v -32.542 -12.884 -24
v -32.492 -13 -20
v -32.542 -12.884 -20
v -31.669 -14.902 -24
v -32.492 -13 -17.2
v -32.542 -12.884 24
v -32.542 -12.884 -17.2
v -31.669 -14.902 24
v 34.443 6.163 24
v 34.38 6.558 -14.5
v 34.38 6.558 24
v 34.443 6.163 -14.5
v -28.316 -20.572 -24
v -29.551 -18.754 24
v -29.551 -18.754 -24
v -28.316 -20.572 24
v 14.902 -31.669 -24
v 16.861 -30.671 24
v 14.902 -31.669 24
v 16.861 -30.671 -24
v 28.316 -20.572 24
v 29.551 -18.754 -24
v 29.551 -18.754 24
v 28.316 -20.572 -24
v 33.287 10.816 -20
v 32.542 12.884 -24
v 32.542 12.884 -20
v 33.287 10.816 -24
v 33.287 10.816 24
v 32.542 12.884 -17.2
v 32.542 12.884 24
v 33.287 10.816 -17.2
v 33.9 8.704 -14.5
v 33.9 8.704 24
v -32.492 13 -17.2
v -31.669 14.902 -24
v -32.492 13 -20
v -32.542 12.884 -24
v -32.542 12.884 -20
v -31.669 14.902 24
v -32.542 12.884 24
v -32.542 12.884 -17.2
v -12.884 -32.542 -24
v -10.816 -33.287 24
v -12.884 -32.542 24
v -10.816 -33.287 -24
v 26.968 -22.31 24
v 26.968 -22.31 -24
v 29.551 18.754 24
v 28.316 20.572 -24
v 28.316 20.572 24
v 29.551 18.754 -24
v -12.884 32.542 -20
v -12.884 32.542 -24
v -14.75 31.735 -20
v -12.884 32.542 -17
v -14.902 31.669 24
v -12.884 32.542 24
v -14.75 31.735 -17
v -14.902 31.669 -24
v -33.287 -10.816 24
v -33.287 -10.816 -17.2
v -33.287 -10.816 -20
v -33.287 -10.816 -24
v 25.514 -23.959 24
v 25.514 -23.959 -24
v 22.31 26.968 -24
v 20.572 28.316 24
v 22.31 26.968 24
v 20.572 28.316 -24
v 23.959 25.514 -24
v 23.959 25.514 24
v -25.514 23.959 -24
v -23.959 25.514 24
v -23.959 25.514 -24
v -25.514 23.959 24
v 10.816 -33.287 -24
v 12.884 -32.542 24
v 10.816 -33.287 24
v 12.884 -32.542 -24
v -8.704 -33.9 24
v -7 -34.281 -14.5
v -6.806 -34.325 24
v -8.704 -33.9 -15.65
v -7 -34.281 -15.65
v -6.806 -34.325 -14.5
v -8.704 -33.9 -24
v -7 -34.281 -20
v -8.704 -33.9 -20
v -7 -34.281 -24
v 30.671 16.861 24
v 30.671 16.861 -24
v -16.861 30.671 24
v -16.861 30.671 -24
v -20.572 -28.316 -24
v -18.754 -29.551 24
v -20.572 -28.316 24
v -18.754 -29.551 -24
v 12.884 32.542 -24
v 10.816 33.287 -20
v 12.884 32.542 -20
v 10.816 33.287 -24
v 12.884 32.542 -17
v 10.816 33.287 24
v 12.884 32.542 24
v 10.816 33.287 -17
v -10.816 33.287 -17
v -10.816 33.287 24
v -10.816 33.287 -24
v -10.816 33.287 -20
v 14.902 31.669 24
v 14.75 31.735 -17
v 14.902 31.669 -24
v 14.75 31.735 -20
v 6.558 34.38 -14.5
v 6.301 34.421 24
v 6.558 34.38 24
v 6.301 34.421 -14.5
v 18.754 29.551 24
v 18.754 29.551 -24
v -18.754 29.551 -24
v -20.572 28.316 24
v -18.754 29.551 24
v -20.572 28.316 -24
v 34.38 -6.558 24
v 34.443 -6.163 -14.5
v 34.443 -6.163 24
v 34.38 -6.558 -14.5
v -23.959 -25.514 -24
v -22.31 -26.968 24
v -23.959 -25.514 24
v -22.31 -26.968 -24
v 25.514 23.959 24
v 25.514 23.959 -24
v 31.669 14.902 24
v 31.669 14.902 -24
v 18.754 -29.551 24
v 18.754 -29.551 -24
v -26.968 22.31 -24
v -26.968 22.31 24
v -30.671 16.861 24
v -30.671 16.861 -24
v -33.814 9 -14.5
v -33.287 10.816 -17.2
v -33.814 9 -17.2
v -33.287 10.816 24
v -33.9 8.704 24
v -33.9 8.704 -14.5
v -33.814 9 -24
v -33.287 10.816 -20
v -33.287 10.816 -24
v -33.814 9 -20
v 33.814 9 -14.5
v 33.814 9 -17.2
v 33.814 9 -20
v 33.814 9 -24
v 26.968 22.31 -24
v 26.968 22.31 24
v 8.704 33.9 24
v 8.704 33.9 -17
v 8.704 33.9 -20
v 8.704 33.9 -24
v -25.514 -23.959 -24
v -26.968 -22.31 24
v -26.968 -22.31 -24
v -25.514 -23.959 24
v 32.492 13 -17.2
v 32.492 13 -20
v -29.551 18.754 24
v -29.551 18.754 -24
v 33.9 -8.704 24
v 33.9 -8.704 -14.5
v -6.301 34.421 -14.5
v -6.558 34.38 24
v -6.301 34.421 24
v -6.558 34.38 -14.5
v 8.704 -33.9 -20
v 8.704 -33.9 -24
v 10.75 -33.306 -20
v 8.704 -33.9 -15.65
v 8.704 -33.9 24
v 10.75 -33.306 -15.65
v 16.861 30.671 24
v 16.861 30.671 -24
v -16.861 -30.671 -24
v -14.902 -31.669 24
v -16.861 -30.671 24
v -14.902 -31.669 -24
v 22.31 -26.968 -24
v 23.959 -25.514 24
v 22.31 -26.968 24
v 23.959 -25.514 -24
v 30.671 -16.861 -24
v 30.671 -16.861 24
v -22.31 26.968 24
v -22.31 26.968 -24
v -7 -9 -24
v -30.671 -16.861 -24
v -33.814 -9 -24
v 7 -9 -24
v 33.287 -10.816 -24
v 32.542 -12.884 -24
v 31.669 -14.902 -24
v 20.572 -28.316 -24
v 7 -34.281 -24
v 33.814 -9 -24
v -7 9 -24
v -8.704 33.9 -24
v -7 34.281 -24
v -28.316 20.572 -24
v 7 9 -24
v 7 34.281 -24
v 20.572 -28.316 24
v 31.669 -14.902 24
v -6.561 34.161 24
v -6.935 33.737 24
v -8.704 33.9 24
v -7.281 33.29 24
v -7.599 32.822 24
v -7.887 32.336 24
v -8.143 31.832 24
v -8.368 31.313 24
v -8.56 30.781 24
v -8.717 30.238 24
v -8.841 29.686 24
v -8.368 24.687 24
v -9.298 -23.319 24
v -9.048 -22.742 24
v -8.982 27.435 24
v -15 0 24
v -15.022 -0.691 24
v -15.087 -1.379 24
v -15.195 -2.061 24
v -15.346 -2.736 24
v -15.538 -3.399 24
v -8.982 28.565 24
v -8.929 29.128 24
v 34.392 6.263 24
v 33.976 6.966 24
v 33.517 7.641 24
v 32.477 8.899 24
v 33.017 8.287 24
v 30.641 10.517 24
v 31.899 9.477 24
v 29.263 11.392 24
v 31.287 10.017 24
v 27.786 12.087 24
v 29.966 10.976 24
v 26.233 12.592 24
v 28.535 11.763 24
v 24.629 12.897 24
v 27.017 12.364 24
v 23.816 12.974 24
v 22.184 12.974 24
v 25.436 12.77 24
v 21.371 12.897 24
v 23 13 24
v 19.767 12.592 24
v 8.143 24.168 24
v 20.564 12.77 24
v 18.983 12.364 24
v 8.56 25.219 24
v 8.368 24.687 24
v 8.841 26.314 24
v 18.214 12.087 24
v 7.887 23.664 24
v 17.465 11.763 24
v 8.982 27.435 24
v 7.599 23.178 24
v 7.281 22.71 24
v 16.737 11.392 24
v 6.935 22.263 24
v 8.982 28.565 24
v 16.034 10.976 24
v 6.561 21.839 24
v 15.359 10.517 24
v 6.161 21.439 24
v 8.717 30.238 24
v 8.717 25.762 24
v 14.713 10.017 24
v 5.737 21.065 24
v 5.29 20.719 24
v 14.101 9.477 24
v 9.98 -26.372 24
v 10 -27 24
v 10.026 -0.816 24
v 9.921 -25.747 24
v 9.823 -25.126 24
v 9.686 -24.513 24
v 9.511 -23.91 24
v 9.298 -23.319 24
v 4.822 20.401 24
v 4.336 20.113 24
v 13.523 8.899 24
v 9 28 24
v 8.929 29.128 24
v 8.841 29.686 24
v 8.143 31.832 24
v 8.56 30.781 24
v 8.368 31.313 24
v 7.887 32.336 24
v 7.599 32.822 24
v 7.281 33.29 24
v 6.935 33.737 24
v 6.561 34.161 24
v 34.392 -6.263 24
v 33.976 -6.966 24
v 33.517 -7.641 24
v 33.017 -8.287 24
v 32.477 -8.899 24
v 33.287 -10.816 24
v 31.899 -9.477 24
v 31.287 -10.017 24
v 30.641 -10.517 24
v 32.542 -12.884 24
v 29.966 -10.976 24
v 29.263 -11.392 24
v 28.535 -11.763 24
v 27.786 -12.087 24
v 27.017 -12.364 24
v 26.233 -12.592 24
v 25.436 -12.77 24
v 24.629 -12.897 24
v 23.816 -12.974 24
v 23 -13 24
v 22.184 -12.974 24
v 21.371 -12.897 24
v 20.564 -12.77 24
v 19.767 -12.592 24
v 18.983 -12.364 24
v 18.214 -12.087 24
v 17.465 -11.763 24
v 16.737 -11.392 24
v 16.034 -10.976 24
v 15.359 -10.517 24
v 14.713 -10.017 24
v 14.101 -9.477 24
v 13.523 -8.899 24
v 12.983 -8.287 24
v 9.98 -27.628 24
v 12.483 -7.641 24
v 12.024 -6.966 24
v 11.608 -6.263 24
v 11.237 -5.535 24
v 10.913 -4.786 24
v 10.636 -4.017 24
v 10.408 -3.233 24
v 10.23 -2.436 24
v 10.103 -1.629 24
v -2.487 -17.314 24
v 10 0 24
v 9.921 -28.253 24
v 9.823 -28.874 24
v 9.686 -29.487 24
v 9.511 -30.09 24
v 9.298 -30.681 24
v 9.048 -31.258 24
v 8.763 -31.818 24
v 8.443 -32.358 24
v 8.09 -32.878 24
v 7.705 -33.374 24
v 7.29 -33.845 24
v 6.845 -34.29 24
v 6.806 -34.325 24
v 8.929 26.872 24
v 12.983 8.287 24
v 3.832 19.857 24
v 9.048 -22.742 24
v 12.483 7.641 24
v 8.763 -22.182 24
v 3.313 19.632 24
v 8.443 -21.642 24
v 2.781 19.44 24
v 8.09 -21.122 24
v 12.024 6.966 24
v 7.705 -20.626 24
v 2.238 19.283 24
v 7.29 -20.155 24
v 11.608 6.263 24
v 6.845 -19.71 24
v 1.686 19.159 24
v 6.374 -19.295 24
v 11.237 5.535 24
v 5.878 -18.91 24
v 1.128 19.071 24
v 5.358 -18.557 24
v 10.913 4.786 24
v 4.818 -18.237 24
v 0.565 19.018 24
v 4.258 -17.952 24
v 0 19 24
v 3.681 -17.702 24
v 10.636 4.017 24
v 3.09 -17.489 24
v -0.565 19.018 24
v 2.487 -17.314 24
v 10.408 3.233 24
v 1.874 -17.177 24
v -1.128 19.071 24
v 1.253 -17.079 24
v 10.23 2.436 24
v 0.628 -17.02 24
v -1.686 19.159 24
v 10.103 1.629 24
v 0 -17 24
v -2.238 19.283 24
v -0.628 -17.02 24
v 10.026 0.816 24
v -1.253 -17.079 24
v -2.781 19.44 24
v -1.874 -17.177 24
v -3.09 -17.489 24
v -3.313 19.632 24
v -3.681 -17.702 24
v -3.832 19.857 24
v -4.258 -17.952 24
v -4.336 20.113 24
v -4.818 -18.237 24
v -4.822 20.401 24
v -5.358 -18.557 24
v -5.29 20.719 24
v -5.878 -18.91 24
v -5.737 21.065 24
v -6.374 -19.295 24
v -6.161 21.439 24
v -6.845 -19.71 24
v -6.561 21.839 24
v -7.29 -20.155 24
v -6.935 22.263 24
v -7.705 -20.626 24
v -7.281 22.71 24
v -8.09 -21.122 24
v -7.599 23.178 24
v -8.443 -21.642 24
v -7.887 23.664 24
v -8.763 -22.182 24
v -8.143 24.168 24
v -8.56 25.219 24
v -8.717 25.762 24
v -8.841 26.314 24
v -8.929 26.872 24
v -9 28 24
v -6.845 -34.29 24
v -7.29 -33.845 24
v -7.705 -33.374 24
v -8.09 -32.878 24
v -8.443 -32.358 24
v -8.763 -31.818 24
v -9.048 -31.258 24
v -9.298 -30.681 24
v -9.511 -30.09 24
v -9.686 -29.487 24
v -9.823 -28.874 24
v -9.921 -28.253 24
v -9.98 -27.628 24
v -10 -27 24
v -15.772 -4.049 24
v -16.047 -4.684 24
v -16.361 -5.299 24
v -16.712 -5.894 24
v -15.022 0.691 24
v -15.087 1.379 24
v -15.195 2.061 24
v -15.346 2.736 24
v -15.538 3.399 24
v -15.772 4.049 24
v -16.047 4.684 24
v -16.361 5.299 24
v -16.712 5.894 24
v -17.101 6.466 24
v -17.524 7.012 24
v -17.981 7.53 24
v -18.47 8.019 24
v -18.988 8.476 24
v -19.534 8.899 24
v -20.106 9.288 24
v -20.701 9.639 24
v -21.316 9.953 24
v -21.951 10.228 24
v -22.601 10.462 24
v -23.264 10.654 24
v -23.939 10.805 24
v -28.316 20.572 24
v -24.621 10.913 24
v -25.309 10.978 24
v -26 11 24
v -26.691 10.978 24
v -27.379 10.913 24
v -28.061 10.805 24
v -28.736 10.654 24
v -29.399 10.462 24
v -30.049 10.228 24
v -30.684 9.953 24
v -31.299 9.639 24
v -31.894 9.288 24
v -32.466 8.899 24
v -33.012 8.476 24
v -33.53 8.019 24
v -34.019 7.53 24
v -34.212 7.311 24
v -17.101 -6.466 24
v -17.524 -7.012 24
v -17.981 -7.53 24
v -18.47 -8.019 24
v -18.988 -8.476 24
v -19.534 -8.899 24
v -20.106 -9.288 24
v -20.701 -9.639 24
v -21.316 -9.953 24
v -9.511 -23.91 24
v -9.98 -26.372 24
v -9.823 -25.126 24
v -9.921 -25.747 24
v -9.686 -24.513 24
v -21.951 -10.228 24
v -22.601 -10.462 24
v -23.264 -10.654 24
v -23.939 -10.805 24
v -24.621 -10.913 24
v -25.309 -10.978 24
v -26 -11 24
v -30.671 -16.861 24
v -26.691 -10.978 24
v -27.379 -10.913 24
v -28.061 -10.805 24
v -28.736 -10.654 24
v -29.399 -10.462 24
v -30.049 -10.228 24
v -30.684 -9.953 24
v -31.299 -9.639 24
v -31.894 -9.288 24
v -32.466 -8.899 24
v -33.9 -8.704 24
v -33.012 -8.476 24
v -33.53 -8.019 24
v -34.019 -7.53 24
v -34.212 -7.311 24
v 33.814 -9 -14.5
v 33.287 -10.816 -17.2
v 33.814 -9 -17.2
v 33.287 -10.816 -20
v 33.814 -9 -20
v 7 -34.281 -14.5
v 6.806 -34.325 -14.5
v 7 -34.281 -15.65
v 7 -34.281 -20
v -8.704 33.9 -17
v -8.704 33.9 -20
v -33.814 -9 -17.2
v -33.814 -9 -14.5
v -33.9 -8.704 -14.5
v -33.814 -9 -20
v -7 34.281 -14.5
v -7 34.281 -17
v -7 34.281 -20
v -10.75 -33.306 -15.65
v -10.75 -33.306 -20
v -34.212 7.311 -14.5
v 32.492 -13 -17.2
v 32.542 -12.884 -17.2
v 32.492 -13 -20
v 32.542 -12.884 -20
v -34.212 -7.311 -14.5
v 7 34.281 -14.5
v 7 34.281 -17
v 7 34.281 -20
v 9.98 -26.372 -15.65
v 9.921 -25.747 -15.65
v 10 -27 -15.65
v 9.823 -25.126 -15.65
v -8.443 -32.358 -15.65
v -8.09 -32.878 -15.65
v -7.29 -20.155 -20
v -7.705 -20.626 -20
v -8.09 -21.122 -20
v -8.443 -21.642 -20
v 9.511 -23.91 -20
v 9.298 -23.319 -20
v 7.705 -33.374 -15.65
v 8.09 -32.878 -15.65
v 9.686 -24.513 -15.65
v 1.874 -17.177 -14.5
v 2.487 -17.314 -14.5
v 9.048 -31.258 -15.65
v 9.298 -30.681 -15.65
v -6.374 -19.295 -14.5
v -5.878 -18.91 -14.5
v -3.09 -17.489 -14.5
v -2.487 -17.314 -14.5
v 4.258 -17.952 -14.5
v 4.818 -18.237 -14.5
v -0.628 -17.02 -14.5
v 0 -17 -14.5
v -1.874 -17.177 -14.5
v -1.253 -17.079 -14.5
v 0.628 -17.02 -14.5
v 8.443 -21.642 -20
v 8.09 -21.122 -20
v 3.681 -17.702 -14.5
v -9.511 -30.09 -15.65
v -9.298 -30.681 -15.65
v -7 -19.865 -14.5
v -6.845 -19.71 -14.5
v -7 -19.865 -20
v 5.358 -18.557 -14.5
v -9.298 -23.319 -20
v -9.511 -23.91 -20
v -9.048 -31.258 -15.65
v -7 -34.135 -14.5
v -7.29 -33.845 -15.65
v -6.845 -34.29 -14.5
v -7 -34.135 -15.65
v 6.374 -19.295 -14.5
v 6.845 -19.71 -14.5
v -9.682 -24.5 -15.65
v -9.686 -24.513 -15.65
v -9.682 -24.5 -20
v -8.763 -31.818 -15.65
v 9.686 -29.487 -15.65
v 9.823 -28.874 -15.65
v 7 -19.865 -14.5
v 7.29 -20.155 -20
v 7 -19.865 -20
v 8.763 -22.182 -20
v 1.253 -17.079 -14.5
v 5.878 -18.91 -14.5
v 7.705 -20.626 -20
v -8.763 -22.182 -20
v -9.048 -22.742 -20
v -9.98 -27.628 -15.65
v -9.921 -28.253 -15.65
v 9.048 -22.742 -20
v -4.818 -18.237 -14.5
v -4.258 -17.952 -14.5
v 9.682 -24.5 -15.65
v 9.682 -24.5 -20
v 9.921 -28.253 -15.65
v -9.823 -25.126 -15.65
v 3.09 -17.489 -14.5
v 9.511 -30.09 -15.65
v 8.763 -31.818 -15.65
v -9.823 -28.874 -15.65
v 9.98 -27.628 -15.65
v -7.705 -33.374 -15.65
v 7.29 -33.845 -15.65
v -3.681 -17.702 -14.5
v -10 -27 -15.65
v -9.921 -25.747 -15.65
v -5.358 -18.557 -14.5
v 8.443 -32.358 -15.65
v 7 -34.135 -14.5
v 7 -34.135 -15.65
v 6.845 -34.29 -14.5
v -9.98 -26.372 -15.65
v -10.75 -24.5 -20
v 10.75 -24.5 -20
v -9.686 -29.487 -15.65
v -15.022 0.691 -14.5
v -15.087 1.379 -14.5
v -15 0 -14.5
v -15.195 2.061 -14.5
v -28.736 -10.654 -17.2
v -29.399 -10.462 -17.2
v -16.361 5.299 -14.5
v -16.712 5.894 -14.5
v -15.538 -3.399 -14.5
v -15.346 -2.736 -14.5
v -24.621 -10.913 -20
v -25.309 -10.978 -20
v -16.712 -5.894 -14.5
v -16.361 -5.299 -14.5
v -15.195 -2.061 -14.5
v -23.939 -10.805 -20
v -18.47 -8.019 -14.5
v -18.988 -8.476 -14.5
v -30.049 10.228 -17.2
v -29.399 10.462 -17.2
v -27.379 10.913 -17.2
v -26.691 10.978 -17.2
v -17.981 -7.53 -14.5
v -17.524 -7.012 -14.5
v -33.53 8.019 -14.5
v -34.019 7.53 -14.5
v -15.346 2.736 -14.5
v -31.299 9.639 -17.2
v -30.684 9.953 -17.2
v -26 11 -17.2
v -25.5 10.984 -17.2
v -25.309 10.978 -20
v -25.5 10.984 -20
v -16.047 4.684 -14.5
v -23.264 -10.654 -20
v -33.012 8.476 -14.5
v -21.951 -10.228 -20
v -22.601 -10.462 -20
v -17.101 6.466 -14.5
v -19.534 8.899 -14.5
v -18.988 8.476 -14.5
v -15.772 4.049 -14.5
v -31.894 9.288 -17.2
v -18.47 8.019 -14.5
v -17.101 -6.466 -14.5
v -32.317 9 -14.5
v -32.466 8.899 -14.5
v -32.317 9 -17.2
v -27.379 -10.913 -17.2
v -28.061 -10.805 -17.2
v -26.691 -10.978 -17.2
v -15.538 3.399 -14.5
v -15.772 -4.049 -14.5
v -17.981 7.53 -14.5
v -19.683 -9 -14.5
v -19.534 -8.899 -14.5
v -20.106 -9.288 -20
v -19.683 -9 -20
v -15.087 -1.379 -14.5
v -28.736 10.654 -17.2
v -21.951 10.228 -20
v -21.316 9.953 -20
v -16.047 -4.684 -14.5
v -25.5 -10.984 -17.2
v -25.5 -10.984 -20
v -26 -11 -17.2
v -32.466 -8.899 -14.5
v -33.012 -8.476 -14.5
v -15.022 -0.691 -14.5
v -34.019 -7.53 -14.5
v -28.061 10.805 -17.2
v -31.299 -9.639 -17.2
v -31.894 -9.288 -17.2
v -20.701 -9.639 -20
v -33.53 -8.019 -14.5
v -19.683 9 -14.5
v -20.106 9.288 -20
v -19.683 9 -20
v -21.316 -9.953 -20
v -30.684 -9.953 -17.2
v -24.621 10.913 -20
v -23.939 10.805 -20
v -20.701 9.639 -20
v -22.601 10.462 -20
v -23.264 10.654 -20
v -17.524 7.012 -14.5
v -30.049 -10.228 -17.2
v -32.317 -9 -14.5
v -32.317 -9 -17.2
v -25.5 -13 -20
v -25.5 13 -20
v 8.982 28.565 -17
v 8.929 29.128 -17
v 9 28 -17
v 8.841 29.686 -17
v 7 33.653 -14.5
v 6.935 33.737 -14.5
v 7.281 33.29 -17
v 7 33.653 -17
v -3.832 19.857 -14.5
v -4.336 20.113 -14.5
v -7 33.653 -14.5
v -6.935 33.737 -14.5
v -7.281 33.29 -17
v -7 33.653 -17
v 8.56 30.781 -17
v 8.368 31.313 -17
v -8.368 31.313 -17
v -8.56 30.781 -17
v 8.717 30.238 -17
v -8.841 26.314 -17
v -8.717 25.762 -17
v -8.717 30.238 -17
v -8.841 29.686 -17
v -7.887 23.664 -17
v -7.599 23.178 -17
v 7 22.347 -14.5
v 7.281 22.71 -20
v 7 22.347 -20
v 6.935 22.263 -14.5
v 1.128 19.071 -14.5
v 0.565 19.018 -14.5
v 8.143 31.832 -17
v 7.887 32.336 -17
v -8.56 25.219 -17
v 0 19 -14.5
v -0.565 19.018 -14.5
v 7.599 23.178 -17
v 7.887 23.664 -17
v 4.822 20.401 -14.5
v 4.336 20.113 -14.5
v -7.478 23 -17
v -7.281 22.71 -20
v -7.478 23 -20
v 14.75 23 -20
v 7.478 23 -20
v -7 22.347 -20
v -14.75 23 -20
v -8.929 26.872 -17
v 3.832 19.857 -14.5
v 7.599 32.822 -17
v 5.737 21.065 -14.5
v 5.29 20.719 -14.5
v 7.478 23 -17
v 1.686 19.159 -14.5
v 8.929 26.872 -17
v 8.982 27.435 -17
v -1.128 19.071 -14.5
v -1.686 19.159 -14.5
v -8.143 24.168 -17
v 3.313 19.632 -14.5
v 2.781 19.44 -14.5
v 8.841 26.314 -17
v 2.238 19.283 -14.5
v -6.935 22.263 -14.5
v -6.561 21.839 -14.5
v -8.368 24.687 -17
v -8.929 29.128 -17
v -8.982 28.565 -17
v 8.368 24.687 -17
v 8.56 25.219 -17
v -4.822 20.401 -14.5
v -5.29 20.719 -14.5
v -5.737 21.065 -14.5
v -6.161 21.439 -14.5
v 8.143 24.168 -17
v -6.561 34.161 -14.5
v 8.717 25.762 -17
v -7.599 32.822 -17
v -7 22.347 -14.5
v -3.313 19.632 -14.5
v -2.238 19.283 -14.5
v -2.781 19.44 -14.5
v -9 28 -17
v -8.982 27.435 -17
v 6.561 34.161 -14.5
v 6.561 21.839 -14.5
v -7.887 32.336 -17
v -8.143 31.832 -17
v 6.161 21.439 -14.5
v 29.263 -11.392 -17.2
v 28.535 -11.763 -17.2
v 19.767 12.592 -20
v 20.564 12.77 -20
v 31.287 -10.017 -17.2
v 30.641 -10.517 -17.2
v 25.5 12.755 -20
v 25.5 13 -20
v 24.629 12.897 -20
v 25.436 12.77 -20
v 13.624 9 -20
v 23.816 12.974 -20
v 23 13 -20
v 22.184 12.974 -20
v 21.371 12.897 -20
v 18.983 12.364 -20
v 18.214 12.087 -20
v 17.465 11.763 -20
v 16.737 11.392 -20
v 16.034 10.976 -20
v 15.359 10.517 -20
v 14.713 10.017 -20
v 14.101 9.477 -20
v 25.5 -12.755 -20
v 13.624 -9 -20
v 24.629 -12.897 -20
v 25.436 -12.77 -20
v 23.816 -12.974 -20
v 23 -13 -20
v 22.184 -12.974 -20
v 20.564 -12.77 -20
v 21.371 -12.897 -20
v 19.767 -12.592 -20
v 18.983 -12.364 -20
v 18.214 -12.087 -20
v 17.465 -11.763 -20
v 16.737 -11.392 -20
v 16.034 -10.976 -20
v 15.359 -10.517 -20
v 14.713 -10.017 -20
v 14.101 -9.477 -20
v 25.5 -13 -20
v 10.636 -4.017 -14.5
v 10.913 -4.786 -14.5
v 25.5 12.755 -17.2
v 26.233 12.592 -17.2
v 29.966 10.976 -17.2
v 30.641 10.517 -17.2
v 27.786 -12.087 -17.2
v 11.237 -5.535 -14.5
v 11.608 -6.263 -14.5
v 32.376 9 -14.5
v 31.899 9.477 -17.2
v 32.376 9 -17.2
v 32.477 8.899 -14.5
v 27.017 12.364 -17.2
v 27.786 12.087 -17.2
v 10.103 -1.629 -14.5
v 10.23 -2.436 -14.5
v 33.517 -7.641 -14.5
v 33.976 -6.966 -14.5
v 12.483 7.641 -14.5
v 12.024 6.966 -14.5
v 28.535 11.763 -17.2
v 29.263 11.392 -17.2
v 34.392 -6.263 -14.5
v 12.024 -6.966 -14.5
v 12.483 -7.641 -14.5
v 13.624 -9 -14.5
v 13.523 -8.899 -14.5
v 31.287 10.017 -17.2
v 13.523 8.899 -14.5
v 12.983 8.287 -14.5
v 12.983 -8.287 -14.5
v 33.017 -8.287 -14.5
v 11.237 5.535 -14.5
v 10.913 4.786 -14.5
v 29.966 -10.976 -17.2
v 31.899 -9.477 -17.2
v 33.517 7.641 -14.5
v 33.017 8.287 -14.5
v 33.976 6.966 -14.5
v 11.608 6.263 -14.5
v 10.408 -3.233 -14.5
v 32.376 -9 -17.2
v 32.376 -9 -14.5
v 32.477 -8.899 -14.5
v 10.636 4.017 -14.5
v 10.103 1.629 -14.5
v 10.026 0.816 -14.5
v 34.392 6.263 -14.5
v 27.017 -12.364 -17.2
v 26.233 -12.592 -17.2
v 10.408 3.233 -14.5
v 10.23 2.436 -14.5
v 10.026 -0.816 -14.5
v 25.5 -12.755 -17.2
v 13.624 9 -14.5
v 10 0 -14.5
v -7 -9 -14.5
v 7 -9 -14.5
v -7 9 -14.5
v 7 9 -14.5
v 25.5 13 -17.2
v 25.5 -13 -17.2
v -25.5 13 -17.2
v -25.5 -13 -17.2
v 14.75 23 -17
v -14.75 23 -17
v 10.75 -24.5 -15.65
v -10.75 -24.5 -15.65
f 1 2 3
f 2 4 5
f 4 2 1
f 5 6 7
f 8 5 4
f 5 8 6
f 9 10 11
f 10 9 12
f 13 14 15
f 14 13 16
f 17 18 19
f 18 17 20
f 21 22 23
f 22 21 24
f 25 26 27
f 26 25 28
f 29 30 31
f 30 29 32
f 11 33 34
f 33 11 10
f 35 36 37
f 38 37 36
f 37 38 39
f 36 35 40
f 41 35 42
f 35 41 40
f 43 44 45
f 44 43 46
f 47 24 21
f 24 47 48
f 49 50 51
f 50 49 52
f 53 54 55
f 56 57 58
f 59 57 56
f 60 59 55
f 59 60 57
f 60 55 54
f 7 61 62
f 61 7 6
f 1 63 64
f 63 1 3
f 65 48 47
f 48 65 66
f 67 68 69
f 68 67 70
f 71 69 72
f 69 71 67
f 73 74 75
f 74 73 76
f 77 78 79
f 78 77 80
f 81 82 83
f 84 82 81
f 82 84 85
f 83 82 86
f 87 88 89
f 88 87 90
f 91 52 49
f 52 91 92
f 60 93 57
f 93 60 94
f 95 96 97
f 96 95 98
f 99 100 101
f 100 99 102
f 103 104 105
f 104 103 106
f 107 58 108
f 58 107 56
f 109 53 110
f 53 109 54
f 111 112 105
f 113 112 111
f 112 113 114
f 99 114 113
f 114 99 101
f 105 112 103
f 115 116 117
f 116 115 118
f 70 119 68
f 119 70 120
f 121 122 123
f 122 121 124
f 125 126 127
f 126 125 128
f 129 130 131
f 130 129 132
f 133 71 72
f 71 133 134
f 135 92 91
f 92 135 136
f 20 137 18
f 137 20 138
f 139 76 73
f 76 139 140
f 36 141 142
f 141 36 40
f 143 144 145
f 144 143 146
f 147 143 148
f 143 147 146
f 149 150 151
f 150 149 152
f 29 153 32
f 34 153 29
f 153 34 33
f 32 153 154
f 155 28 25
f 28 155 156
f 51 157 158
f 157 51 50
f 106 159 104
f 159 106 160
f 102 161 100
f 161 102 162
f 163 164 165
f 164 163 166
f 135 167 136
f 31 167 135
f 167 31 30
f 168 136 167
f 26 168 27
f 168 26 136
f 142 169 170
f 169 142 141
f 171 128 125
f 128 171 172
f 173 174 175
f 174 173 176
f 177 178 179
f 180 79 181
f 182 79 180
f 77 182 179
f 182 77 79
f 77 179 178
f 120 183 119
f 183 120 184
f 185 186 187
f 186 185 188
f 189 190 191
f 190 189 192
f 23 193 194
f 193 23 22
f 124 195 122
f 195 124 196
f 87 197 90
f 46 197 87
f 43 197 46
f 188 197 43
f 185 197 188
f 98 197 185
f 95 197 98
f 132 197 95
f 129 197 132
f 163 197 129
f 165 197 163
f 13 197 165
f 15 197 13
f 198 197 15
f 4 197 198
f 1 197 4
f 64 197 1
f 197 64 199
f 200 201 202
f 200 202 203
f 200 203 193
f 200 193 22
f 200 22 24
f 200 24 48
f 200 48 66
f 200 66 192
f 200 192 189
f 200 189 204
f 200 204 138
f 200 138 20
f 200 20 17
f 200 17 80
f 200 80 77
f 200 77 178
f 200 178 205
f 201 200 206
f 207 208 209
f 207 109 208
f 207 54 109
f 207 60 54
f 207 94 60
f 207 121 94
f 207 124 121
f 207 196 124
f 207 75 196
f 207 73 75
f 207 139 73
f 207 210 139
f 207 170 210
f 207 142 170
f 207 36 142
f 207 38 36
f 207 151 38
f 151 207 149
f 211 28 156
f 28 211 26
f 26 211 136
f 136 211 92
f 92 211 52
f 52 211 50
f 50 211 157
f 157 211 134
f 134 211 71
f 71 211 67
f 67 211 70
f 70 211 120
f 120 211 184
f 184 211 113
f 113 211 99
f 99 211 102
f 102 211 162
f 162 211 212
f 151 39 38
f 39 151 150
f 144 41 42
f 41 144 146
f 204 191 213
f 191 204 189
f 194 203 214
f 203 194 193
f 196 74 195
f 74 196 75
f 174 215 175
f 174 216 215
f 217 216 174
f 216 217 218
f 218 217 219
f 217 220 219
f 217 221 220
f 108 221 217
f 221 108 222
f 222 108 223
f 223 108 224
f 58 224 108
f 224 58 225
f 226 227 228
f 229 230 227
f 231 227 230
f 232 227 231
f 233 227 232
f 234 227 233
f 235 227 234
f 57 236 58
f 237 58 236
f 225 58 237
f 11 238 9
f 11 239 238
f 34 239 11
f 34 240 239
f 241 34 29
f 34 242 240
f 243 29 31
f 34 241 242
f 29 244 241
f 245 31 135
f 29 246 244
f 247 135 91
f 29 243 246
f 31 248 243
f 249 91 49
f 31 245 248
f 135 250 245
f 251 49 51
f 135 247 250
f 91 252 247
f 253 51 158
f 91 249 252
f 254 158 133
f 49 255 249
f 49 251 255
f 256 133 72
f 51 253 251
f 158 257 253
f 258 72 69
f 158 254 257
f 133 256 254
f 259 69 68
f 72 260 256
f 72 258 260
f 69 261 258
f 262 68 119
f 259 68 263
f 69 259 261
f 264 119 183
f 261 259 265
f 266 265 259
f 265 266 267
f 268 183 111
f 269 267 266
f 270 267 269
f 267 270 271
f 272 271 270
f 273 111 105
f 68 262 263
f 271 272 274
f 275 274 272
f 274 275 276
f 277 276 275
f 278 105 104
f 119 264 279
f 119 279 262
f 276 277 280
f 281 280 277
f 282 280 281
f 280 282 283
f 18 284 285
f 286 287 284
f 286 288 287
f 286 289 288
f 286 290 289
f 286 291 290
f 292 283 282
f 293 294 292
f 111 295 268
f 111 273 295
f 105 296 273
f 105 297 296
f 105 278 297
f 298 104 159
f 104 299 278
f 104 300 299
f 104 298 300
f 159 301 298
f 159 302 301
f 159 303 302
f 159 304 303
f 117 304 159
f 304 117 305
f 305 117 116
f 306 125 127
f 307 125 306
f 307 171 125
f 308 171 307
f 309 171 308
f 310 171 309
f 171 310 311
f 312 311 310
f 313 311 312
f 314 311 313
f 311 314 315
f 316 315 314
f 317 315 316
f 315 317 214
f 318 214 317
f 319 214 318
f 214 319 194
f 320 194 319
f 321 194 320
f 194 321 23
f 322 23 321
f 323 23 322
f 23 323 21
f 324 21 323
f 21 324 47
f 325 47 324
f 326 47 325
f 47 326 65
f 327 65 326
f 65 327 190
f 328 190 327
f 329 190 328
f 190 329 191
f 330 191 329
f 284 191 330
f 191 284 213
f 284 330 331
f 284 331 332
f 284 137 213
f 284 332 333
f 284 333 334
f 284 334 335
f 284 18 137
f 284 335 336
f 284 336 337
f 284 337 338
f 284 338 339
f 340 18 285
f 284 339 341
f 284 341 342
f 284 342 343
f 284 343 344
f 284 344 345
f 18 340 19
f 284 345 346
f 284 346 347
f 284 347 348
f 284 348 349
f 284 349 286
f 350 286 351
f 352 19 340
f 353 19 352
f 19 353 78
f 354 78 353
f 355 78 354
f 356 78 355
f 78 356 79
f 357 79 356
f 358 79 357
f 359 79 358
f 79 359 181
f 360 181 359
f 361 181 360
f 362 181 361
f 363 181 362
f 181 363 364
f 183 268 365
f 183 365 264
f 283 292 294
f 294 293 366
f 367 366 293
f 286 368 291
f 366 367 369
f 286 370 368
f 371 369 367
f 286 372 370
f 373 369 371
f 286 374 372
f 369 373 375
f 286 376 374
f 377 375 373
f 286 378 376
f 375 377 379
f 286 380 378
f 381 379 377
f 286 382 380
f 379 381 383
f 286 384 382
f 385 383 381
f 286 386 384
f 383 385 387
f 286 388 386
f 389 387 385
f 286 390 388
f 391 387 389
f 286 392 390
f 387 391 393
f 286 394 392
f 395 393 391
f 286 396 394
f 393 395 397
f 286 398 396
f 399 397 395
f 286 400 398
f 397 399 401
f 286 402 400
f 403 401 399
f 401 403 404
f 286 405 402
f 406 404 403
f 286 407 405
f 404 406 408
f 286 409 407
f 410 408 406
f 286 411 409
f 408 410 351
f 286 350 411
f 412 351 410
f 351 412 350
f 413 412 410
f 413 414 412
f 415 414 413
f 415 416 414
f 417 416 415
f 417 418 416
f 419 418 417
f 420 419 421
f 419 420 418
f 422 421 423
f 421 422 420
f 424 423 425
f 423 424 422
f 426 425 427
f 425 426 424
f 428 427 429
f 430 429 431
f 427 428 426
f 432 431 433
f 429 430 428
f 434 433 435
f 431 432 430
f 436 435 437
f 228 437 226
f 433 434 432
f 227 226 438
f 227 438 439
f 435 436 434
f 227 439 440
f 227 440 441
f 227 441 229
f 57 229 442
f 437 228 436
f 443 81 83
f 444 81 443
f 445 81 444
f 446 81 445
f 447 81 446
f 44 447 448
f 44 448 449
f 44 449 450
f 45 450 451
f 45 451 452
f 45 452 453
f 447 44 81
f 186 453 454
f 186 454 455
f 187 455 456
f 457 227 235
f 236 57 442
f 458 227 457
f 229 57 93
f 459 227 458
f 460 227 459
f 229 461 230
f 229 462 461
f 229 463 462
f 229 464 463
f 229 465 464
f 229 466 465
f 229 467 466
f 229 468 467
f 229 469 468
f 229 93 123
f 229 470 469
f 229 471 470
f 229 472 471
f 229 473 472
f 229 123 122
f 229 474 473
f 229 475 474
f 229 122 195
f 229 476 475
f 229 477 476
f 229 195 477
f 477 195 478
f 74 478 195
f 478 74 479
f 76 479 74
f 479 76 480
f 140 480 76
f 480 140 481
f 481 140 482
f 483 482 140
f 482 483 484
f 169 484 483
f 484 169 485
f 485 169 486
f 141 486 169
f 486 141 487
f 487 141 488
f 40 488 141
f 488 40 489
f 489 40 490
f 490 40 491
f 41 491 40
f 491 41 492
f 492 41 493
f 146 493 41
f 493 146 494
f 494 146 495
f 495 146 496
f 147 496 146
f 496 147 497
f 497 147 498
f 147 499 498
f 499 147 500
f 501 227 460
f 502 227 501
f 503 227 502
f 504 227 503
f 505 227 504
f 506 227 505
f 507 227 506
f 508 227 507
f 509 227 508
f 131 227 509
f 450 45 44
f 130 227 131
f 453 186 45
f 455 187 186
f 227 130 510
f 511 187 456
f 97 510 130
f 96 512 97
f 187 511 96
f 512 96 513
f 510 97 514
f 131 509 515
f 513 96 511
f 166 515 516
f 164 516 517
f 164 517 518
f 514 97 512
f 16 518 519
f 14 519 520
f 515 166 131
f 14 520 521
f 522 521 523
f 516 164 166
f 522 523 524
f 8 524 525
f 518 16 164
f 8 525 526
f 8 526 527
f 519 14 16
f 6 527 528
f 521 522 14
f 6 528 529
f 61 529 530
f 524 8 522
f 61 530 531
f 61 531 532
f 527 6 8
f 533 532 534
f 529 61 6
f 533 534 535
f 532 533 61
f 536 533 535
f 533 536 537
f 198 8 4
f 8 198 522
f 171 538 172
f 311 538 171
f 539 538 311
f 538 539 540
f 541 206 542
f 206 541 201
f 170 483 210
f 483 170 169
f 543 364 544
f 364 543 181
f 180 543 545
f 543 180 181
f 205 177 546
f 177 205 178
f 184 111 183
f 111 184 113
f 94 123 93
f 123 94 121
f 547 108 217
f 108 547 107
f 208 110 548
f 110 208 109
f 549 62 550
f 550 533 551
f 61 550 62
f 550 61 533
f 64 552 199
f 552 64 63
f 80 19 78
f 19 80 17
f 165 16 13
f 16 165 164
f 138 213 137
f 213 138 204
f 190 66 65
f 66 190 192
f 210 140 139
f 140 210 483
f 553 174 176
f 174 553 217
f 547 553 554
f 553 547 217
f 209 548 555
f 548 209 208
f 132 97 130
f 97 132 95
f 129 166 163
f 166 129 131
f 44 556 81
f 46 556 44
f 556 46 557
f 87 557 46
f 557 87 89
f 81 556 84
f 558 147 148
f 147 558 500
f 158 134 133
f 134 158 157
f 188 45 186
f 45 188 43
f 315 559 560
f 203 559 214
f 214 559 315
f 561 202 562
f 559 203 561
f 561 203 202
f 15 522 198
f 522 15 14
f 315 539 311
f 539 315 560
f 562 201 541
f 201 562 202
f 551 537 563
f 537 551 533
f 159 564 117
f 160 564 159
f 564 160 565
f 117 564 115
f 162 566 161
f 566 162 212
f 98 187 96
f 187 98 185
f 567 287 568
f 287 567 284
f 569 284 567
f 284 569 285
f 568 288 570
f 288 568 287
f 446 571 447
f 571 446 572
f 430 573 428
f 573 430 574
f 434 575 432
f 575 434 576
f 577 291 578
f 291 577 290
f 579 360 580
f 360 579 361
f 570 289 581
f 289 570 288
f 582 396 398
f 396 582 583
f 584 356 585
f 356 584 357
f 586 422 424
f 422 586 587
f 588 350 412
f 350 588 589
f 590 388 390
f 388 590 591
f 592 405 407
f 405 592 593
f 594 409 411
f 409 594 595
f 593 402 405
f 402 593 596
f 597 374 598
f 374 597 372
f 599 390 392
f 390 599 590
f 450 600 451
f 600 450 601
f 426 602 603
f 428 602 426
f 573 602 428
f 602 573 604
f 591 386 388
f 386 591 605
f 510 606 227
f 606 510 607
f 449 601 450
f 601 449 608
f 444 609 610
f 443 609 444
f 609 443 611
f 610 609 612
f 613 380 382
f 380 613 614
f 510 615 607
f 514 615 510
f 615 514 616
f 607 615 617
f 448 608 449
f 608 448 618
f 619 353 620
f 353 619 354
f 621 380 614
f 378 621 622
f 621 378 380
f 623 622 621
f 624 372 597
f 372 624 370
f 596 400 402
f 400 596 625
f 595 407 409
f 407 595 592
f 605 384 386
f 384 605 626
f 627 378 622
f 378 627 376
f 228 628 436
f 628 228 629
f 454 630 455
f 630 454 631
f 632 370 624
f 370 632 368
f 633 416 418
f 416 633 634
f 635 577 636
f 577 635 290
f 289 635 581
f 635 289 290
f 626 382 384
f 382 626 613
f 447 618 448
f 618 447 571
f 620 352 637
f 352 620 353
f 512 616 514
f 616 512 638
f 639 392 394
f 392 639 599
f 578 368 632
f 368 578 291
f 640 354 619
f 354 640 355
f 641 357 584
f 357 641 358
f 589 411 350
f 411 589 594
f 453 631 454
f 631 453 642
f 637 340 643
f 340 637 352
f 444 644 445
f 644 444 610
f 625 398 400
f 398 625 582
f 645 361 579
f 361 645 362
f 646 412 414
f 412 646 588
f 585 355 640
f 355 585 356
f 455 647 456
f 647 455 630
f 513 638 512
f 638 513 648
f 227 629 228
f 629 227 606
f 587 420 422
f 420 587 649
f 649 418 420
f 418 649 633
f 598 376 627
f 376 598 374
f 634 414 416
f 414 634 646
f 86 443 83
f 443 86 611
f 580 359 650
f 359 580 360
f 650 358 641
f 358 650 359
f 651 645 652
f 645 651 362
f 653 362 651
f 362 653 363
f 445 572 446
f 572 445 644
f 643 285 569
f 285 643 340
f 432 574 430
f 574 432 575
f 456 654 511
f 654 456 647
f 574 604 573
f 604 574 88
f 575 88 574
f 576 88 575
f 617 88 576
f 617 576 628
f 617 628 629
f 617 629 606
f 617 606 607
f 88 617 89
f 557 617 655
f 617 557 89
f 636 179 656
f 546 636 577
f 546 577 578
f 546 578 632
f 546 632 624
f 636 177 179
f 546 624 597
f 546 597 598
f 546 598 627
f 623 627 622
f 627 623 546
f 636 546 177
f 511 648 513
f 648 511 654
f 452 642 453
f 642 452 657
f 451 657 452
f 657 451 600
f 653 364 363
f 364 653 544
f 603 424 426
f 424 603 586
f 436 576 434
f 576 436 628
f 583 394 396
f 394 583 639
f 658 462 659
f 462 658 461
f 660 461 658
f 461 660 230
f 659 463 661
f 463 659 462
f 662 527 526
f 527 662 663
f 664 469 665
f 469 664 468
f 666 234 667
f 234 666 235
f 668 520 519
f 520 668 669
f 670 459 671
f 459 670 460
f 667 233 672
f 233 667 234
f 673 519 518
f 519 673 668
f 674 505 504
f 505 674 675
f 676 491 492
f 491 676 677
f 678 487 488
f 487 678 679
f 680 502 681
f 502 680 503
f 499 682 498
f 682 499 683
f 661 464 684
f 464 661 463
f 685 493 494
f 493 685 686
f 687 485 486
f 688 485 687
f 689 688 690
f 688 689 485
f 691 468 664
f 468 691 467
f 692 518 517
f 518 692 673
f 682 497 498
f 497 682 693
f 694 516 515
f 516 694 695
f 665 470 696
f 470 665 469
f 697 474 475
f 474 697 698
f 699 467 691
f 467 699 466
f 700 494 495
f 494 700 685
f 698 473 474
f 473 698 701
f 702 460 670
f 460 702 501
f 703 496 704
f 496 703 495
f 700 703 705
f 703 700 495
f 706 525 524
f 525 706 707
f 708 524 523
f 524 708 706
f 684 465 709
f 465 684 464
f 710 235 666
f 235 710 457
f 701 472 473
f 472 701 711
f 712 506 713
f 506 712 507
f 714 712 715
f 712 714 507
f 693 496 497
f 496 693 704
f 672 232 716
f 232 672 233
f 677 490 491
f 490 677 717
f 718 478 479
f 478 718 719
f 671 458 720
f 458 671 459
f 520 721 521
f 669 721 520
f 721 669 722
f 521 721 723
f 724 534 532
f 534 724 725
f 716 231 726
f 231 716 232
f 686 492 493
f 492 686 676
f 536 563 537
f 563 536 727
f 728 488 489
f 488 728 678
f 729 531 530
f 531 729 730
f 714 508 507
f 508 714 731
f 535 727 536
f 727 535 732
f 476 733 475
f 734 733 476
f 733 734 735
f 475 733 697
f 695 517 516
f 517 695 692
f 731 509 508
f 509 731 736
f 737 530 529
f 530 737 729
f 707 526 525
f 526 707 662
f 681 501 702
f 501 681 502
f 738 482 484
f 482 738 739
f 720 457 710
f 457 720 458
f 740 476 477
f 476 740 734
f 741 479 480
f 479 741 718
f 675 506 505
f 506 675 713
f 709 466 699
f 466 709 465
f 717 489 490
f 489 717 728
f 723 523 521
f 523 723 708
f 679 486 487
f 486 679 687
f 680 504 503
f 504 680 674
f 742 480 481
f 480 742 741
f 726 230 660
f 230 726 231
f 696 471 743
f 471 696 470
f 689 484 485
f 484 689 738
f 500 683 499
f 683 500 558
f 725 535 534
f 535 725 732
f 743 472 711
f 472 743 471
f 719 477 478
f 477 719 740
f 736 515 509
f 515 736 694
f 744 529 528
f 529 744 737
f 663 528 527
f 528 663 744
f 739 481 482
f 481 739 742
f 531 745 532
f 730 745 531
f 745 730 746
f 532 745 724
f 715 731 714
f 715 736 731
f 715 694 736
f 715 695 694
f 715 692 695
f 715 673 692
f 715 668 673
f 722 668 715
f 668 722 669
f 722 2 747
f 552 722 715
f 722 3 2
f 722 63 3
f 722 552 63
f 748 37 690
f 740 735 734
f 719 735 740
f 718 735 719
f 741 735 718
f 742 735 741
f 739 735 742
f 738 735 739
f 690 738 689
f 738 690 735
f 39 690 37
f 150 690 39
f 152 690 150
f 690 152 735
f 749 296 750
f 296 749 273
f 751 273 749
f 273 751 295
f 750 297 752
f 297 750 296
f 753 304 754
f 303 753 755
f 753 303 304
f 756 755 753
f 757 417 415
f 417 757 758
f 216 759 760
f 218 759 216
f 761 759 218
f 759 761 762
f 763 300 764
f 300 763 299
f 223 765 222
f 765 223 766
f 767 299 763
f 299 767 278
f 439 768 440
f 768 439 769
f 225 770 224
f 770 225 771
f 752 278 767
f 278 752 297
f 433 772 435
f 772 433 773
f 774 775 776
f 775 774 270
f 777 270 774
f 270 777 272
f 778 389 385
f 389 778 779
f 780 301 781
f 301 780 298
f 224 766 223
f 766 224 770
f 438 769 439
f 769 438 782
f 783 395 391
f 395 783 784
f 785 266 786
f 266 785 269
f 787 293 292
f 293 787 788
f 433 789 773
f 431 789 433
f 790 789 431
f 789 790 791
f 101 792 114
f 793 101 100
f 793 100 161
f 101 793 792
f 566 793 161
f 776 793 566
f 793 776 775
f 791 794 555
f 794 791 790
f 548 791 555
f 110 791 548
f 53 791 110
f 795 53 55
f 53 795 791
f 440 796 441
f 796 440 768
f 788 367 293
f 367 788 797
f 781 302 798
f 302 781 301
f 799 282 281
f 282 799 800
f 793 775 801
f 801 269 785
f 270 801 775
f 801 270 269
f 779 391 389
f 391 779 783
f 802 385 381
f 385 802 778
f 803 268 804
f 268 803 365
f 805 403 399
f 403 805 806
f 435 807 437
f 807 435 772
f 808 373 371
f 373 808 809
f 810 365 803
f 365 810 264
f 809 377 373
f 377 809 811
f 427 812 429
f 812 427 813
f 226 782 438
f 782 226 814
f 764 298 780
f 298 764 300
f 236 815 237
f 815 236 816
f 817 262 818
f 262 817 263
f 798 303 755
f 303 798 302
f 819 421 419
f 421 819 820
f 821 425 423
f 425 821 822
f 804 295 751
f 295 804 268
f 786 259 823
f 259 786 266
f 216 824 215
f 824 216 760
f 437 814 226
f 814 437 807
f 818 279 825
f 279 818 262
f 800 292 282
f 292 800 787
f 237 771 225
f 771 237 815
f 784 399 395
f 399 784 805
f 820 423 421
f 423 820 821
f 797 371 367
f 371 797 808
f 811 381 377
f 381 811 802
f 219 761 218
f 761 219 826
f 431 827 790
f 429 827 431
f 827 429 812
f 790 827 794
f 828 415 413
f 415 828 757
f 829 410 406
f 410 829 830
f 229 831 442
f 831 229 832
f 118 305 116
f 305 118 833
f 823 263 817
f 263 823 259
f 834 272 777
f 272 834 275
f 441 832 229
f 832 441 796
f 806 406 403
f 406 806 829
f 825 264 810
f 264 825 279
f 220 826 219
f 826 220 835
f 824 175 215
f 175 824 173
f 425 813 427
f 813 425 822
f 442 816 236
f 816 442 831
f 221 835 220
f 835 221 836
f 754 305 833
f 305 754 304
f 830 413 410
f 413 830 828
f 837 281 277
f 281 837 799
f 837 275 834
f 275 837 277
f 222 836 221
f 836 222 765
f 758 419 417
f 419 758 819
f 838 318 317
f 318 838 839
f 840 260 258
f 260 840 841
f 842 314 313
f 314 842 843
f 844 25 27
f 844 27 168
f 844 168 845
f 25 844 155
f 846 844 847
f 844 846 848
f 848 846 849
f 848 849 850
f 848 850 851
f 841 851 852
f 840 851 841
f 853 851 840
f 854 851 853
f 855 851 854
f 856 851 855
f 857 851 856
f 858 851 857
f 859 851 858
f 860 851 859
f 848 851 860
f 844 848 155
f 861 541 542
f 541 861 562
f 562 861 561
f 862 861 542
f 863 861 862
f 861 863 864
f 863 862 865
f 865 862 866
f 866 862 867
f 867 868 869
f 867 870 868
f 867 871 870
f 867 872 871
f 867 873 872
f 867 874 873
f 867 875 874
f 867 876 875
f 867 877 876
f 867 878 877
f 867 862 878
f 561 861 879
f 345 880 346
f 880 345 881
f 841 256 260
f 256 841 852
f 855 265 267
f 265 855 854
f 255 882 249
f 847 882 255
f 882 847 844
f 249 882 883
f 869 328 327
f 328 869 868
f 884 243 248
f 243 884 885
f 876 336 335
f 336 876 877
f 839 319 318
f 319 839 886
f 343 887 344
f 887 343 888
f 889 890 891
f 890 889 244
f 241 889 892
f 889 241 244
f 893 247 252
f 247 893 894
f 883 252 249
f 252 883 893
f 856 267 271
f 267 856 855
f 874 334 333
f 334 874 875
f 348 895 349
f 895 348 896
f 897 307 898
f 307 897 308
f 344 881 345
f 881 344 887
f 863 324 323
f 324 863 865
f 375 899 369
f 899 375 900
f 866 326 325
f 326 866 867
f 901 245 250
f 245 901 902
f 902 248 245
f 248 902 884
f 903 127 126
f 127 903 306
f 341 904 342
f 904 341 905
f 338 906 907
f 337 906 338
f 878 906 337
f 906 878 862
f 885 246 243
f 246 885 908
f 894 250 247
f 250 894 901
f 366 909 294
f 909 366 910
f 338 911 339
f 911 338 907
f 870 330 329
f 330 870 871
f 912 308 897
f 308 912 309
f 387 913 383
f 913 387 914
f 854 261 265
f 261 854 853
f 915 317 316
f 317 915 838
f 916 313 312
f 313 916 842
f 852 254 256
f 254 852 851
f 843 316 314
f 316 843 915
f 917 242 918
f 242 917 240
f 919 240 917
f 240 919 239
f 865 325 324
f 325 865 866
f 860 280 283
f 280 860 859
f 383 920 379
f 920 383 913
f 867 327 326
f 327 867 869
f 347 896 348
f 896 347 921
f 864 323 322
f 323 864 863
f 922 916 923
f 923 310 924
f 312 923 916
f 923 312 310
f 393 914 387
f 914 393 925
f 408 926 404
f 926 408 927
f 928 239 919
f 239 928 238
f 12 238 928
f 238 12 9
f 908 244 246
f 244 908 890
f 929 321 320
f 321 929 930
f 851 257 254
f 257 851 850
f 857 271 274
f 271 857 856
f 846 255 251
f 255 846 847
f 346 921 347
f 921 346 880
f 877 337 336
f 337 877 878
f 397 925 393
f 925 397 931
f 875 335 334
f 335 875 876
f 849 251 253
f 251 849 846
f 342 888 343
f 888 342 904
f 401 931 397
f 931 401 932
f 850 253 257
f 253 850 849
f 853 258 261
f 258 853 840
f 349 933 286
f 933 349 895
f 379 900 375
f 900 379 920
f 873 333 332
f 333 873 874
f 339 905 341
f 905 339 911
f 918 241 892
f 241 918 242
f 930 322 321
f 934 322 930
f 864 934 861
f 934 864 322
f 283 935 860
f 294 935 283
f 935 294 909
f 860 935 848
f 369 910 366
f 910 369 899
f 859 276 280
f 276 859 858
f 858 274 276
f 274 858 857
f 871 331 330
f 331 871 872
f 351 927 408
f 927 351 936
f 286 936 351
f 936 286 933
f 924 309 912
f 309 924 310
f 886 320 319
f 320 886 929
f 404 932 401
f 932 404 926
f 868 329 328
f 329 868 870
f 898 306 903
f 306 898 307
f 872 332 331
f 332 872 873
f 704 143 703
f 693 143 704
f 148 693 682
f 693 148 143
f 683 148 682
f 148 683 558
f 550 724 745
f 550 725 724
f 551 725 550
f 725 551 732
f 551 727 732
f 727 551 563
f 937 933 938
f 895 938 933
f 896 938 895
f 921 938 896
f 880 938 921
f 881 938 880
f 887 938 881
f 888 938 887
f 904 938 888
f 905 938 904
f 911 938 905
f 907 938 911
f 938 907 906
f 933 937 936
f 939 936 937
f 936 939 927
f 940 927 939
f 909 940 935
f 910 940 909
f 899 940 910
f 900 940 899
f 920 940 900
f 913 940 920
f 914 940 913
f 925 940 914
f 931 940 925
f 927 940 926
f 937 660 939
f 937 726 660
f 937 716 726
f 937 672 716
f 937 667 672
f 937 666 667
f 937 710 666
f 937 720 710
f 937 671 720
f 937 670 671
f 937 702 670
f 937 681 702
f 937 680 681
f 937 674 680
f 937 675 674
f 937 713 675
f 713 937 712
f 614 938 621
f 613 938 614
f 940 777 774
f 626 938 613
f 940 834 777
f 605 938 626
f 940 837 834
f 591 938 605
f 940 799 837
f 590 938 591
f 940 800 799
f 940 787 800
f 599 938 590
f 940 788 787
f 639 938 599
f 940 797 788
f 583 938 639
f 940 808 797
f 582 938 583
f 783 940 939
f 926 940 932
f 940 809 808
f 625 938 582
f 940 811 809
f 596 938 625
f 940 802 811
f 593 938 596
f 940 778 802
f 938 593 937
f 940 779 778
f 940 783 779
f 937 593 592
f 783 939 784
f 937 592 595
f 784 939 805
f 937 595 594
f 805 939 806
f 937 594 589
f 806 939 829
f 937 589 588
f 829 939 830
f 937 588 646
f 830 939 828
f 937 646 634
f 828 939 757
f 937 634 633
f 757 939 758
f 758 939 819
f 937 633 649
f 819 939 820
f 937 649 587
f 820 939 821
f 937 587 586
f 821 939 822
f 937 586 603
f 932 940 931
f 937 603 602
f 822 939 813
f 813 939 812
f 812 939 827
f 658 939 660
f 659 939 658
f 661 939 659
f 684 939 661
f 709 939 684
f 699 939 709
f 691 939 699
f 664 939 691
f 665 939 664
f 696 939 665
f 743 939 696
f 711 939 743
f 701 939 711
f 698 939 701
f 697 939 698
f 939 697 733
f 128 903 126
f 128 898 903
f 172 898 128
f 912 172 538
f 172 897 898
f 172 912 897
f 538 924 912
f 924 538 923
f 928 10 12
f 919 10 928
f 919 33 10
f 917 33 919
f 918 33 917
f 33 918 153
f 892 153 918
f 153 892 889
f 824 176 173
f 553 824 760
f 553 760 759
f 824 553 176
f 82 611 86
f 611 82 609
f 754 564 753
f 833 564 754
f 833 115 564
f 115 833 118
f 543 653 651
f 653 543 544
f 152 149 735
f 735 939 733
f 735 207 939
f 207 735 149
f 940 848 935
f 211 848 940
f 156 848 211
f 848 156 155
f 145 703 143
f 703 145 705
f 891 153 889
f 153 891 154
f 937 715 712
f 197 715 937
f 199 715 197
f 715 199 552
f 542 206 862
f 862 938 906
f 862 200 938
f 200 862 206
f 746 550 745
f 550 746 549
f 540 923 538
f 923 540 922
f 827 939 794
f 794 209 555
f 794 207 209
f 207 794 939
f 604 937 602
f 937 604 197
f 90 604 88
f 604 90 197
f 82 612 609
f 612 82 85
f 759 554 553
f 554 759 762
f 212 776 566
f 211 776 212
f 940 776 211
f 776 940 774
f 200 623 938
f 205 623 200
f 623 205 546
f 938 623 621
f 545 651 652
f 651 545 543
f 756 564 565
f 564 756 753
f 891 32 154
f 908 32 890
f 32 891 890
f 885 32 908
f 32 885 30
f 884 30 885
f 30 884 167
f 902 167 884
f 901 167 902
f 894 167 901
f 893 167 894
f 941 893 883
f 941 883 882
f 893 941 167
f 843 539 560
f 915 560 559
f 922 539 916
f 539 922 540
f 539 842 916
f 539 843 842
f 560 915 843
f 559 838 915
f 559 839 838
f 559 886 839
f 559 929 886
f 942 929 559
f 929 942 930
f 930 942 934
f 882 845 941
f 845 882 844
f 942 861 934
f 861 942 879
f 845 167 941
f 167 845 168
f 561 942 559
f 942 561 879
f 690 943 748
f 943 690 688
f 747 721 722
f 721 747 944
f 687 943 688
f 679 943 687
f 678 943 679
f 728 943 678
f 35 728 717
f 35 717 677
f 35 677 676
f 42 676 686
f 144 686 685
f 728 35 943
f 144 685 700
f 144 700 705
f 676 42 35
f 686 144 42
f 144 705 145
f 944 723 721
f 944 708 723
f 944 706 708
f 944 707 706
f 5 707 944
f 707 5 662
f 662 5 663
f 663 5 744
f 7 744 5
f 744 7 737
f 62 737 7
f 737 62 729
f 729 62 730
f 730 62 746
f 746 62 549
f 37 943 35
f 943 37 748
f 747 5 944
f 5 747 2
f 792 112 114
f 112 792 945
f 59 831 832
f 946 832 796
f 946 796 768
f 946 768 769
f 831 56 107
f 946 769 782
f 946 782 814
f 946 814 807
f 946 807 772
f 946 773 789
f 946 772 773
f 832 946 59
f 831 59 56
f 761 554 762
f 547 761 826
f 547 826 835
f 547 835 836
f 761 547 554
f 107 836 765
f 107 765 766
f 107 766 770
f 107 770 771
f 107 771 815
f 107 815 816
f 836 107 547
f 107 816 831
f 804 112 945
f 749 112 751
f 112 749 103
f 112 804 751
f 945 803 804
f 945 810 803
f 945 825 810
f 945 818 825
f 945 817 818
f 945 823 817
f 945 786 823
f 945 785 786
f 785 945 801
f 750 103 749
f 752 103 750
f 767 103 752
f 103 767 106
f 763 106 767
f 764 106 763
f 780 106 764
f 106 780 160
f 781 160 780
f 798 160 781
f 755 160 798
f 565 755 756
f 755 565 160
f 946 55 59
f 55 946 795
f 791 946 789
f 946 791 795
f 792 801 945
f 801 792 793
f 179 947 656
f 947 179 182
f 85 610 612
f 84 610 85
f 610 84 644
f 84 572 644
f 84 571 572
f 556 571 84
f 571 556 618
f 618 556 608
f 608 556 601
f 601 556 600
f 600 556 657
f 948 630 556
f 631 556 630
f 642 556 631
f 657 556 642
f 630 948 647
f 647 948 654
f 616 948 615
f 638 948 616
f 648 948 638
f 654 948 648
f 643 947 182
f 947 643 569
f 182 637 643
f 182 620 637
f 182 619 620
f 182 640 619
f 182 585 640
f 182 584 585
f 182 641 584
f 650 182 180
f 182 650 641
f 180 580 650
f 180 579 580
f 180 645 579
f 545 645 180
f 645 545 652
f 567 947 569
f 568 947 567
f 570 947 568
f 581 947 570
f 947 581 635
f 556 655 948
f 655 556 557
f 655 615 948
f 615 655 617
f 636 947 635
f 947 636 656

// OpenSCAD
//this is the radius of your cup holder, in mm. it is best to under-estimate so the coin cup fits nicely
r = 35;

//this is the height of your cup holder, which I recommend being less than the actual height of your cup holder
h = 48;

$fn = 100;

difference () {
    
    cylinder (h, r, r, center = true); //holder body
    
    translate ([0, -(r - 8), 3]) cylinder (h - 2, 10, 10, center = true); //penny slot
    translate ([-(r - 9), 0, 3]) cylinder (h - 2, 11, 11, center = true); //nickel slot
    translate ([0, (r - 7), 3]) cylinder (h - 2, 9, 9, center = true); //dime slot
    translate ([(r - 12), 0, 3]) cylinder (h - 2, 13, 13, center = true); //quarter slot
    
    translate ([-70,-9,-24.5]) cube (size = [140,18,10]); // fingerslot
	rotate ([0,0,90]) translate ([-70,-7,-24.5]) cube (size = [140,14,10]); // fingerslot
    
    translate ([25.5,-13,-20]) cube (size = [15,26,2.8]); 
	translate ([-40.5,-13,-20]) cube (size = [15,26,2.8]); 
	translate ([-14.75,23,-20]) cube (size = [29.5,15,3]); 
	translate ([-10.75,-34.5,-20]) cube (size = [21.5,10,4.35]); 
    }
    
